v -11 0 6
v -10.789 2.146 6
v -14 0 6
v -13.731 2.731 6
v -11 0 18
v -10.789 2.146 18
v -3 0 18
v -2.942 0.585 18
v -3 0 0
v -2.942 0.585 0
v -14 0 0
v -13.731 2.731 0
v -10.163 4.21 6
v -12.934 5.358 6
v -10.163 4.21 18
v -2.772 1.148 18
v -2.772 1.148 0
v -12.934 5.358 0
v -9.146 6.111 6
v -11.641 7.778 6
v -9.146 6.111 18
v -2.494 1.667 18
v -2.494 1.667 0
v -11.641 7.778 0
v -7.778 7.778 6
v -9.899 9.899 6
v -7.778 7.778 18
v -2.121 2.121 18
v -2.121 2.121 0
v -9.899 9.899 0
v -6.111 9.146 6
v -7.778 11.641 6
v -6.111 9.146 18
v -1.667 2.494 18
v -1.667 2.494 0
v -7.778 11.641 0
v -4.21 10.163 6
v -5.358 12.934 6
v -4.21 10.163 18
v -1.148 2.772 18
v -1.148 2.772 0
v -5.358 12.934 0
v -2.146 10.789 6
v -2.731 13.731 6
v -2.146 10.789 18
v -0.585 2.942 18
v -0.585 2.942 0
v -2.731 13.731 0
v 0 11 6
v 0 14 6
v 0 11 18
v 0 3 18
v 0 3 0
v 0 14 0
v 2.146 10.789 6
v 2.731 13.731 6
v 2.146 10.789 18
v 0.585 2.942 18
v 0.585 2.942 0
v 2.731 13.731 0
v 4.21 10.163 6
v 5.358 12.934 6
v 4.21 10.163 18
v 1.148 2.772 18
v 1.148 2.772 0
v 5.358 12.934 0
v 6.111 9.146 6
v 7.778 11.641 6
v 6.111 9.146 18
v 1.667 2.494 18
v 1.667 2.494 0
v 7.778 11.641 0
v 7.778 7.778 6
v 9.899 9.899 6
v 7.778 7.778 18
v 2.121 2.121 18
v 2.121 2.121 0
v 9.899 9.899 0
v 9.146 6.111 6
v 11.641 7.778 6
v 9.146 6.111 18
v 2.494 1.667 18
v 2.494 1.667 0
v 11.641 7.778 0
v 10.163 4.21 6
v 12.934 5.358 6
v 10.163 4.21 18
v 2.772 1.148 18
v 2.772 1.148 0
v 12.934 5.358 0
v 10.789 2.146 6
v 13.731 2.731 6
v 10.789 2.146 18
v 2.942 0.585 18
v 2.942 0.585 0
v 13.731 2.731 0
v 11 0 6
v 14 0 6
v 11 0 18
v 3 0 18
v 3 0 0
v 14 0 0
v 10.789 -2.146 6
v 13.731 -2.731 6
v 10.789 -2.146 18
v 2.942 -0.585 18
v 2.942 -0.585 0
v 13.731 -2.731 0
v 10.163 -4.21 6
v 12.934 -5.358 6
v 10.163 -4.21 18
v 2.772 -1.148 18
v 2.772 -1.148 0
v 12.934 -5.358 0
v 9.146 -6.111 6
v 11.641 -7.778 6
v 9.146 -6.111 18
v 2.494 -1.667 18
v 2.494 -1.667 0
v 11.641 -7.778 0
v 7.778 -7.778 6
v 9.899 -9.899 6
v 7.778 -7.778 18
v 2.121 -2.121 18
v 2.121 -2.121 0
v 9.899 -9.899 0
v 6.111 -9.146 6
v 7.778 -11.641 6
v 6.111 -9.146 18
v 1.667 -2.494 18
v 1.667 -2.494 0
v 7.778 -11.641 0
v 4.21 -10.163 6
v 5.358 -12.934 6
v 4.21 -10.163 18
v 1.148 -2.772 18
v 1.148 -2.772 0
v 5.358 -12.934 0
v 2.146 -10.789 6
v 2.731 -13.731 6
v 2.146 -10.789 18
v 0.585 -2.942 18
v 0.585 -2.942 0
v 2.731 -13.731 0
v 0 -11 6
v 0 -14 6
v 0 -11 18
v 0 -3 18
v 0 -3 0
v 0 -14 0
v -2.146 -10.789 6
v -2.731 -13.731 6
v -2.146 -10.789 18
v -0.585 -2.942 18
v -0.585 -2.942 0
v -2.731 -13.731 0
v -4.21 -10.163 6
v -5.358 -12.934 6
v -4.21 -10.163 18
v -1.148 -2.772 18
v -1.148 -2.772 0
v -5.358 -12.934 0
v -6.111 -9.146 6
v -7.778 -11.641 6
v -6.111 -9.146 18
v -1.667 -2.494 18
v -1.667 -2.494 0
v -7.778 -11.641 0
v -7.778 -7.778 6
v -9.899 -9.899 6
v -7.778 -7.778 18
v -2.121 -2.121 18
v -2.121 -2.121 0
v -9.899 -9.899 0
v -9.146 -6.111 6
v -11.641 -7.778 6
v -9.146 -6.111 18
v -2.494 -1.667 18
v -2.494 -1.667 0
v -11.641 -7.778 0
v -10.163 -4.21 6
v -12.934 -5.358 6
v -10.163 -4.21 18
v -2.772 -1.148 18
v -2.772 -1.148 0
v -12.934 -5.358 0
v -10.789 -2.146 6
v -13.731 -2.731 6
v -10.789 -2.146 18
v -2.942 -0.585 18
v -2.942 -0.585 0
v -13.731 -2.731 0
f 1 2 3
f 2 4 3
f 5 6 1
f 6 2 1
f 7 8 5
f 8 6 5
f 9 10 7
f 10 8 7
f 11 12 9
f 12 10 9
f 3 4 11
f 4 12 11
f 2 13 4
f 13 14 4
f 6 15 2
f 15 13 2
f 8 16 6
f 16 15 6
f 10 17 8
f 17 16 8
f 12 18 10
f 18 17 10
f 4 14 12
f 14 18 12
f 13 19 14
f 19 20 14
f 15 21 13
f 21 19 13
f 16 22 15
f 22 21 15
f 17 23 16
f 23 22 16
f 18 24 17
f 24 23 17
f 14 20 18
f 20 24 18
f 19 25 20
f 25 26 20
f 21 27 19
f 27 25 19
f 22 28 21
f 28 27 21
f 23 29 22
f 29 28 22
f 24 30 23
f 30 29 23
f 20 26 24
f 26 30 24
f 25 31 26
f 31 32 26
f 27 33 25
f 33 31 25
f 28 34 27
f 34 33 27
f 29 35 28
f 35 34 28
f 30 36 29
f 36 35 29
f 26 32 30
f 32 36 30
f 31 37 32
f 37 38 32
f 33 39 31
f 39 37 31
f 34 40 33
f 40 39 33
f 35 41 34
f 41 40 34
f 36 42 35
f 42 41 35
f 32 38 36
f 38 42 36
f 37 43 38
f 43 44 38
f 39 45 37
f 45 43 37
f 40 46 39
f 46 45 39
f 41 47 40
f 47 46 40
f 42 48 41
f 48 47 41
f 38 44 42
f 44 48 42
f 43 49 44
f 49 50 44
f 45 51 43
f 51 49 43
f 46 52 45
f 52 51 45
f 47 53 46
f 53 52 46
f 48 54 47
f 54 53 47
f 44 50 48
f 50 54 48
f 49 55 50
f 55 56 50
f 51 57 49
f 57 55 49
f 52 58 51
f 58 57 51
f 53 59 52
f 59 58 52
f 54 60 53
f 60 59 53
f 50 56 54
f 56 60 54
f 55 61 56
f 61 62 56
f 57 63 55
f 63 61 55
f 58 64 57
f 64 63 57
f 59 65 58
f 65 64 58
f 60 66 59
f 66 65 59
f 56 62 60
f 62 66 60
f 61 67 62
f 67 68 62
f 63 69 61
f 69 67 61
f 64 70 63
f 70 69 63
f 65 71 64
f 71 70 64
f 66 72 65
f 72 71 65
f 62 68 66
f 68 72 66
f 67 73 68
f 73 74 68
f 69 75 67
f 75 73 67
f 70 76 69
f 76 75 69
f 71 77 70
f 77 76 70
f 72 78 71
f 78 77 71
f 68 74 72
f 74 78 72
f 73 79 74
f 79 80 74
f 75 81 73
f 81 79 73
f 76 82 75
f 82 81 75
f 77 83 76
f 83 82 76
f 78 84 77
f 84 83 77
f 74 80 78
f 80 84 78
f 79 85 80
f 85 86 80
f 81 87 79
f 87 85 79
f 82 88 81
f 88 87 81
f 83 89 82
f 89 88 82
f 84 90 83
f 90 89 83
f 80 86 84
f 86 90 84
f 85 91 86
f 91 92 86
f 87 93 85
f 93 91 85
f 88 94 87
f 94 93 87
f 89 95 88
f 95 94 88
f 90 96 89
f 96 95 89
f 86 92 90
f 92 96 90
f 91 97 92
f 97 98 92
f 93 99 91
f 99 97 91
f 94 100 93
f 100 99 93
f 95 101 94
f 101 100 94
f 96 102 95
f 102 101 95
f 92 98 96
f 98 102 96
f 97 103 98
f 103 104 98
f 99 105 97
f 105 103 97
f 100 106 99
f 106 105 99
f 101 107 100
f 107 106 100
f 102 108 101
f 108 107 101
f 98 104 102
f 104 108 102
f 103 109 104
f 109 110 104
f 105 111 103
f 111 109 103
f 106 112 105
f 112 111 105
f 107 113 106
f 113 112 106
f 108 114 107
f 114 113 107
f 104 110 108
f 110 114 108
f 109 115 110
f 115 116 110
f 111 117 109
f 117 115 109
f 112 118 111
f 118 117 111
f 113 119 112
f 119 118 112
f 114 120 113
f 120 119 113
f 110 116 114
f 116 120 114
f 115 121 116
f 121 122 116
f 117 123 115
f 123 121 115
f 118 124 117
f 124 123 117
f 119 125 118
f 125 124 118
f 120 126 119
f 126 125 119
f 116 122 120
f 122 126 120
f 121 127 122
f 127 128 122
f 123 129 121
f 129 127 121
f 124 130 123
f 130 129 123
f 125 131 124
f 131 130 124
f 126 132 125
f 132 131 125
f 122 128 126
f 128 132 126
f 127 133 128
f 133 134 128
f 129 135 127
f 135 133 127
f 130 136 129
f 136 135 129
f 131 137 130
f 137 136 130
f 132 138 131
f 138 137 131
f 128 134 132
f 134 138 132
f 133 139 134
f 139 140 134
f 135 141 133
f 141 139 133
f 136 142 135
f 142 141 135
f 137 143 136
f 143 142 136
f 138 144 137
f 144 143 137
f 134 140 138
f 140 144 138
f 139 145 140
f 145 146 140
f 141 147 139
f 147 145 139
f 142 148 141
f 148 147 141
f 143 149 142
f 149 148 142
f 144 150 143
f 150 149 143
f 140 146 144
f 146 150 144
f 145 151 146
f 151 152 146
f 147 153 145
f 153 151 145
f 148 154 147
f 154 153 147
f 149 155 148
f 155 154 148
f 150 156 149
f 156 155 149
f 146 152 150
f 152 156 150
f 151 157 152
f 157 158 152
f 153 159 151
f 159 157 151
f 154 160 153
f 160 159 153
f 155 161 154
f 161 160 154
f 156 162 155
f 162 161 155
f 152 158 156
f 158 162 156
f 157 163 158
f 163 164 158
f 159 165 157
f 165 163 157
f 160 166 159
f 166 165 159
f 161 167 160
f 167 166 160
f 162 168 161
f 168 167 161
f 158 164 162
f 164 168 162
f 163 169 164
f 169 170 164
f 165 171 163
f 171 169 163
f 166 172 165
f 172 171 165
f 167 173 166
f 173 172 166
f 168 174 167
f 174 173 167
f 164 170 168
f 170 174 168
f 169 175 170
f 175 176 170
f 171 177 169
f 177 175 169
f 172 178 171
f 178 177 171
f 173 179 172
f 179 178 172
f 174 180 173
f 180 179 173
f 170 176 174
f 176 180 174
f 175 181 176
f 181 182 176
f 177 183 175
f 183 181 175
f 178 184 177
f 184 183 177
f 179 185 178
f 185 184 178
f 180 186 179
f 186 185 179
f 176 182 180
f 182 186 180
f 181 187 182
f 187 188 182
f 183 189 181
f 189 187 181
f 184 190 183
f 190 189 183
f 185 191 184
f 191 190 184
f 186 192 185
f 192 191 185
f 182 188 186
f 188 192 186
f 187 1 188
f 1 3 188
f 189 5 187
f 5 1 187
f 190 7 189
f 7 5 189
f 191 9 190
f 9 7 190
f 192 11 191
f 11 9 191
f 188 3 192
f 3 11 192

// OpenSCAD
$fn = 32;

// ----------------------------------------------------------------------
// Arc stop: collar, 18 mm thick
// ----------------------------------------------------------------------

// --- parameters (mm) ---
revolve_angle = 360;      // full turn around the Z axis
profile_points = 6;       // points of the closed outline

profile = [[3, 0], [14, 0], [14, 6], [11, 6], [11, 18], [3, 18]];  // single closed polygon, 6 points, counter clockwise

// --- the one profile operation ---
rotate_extrude(angle = revolve_angle) polygon(points = profile);
